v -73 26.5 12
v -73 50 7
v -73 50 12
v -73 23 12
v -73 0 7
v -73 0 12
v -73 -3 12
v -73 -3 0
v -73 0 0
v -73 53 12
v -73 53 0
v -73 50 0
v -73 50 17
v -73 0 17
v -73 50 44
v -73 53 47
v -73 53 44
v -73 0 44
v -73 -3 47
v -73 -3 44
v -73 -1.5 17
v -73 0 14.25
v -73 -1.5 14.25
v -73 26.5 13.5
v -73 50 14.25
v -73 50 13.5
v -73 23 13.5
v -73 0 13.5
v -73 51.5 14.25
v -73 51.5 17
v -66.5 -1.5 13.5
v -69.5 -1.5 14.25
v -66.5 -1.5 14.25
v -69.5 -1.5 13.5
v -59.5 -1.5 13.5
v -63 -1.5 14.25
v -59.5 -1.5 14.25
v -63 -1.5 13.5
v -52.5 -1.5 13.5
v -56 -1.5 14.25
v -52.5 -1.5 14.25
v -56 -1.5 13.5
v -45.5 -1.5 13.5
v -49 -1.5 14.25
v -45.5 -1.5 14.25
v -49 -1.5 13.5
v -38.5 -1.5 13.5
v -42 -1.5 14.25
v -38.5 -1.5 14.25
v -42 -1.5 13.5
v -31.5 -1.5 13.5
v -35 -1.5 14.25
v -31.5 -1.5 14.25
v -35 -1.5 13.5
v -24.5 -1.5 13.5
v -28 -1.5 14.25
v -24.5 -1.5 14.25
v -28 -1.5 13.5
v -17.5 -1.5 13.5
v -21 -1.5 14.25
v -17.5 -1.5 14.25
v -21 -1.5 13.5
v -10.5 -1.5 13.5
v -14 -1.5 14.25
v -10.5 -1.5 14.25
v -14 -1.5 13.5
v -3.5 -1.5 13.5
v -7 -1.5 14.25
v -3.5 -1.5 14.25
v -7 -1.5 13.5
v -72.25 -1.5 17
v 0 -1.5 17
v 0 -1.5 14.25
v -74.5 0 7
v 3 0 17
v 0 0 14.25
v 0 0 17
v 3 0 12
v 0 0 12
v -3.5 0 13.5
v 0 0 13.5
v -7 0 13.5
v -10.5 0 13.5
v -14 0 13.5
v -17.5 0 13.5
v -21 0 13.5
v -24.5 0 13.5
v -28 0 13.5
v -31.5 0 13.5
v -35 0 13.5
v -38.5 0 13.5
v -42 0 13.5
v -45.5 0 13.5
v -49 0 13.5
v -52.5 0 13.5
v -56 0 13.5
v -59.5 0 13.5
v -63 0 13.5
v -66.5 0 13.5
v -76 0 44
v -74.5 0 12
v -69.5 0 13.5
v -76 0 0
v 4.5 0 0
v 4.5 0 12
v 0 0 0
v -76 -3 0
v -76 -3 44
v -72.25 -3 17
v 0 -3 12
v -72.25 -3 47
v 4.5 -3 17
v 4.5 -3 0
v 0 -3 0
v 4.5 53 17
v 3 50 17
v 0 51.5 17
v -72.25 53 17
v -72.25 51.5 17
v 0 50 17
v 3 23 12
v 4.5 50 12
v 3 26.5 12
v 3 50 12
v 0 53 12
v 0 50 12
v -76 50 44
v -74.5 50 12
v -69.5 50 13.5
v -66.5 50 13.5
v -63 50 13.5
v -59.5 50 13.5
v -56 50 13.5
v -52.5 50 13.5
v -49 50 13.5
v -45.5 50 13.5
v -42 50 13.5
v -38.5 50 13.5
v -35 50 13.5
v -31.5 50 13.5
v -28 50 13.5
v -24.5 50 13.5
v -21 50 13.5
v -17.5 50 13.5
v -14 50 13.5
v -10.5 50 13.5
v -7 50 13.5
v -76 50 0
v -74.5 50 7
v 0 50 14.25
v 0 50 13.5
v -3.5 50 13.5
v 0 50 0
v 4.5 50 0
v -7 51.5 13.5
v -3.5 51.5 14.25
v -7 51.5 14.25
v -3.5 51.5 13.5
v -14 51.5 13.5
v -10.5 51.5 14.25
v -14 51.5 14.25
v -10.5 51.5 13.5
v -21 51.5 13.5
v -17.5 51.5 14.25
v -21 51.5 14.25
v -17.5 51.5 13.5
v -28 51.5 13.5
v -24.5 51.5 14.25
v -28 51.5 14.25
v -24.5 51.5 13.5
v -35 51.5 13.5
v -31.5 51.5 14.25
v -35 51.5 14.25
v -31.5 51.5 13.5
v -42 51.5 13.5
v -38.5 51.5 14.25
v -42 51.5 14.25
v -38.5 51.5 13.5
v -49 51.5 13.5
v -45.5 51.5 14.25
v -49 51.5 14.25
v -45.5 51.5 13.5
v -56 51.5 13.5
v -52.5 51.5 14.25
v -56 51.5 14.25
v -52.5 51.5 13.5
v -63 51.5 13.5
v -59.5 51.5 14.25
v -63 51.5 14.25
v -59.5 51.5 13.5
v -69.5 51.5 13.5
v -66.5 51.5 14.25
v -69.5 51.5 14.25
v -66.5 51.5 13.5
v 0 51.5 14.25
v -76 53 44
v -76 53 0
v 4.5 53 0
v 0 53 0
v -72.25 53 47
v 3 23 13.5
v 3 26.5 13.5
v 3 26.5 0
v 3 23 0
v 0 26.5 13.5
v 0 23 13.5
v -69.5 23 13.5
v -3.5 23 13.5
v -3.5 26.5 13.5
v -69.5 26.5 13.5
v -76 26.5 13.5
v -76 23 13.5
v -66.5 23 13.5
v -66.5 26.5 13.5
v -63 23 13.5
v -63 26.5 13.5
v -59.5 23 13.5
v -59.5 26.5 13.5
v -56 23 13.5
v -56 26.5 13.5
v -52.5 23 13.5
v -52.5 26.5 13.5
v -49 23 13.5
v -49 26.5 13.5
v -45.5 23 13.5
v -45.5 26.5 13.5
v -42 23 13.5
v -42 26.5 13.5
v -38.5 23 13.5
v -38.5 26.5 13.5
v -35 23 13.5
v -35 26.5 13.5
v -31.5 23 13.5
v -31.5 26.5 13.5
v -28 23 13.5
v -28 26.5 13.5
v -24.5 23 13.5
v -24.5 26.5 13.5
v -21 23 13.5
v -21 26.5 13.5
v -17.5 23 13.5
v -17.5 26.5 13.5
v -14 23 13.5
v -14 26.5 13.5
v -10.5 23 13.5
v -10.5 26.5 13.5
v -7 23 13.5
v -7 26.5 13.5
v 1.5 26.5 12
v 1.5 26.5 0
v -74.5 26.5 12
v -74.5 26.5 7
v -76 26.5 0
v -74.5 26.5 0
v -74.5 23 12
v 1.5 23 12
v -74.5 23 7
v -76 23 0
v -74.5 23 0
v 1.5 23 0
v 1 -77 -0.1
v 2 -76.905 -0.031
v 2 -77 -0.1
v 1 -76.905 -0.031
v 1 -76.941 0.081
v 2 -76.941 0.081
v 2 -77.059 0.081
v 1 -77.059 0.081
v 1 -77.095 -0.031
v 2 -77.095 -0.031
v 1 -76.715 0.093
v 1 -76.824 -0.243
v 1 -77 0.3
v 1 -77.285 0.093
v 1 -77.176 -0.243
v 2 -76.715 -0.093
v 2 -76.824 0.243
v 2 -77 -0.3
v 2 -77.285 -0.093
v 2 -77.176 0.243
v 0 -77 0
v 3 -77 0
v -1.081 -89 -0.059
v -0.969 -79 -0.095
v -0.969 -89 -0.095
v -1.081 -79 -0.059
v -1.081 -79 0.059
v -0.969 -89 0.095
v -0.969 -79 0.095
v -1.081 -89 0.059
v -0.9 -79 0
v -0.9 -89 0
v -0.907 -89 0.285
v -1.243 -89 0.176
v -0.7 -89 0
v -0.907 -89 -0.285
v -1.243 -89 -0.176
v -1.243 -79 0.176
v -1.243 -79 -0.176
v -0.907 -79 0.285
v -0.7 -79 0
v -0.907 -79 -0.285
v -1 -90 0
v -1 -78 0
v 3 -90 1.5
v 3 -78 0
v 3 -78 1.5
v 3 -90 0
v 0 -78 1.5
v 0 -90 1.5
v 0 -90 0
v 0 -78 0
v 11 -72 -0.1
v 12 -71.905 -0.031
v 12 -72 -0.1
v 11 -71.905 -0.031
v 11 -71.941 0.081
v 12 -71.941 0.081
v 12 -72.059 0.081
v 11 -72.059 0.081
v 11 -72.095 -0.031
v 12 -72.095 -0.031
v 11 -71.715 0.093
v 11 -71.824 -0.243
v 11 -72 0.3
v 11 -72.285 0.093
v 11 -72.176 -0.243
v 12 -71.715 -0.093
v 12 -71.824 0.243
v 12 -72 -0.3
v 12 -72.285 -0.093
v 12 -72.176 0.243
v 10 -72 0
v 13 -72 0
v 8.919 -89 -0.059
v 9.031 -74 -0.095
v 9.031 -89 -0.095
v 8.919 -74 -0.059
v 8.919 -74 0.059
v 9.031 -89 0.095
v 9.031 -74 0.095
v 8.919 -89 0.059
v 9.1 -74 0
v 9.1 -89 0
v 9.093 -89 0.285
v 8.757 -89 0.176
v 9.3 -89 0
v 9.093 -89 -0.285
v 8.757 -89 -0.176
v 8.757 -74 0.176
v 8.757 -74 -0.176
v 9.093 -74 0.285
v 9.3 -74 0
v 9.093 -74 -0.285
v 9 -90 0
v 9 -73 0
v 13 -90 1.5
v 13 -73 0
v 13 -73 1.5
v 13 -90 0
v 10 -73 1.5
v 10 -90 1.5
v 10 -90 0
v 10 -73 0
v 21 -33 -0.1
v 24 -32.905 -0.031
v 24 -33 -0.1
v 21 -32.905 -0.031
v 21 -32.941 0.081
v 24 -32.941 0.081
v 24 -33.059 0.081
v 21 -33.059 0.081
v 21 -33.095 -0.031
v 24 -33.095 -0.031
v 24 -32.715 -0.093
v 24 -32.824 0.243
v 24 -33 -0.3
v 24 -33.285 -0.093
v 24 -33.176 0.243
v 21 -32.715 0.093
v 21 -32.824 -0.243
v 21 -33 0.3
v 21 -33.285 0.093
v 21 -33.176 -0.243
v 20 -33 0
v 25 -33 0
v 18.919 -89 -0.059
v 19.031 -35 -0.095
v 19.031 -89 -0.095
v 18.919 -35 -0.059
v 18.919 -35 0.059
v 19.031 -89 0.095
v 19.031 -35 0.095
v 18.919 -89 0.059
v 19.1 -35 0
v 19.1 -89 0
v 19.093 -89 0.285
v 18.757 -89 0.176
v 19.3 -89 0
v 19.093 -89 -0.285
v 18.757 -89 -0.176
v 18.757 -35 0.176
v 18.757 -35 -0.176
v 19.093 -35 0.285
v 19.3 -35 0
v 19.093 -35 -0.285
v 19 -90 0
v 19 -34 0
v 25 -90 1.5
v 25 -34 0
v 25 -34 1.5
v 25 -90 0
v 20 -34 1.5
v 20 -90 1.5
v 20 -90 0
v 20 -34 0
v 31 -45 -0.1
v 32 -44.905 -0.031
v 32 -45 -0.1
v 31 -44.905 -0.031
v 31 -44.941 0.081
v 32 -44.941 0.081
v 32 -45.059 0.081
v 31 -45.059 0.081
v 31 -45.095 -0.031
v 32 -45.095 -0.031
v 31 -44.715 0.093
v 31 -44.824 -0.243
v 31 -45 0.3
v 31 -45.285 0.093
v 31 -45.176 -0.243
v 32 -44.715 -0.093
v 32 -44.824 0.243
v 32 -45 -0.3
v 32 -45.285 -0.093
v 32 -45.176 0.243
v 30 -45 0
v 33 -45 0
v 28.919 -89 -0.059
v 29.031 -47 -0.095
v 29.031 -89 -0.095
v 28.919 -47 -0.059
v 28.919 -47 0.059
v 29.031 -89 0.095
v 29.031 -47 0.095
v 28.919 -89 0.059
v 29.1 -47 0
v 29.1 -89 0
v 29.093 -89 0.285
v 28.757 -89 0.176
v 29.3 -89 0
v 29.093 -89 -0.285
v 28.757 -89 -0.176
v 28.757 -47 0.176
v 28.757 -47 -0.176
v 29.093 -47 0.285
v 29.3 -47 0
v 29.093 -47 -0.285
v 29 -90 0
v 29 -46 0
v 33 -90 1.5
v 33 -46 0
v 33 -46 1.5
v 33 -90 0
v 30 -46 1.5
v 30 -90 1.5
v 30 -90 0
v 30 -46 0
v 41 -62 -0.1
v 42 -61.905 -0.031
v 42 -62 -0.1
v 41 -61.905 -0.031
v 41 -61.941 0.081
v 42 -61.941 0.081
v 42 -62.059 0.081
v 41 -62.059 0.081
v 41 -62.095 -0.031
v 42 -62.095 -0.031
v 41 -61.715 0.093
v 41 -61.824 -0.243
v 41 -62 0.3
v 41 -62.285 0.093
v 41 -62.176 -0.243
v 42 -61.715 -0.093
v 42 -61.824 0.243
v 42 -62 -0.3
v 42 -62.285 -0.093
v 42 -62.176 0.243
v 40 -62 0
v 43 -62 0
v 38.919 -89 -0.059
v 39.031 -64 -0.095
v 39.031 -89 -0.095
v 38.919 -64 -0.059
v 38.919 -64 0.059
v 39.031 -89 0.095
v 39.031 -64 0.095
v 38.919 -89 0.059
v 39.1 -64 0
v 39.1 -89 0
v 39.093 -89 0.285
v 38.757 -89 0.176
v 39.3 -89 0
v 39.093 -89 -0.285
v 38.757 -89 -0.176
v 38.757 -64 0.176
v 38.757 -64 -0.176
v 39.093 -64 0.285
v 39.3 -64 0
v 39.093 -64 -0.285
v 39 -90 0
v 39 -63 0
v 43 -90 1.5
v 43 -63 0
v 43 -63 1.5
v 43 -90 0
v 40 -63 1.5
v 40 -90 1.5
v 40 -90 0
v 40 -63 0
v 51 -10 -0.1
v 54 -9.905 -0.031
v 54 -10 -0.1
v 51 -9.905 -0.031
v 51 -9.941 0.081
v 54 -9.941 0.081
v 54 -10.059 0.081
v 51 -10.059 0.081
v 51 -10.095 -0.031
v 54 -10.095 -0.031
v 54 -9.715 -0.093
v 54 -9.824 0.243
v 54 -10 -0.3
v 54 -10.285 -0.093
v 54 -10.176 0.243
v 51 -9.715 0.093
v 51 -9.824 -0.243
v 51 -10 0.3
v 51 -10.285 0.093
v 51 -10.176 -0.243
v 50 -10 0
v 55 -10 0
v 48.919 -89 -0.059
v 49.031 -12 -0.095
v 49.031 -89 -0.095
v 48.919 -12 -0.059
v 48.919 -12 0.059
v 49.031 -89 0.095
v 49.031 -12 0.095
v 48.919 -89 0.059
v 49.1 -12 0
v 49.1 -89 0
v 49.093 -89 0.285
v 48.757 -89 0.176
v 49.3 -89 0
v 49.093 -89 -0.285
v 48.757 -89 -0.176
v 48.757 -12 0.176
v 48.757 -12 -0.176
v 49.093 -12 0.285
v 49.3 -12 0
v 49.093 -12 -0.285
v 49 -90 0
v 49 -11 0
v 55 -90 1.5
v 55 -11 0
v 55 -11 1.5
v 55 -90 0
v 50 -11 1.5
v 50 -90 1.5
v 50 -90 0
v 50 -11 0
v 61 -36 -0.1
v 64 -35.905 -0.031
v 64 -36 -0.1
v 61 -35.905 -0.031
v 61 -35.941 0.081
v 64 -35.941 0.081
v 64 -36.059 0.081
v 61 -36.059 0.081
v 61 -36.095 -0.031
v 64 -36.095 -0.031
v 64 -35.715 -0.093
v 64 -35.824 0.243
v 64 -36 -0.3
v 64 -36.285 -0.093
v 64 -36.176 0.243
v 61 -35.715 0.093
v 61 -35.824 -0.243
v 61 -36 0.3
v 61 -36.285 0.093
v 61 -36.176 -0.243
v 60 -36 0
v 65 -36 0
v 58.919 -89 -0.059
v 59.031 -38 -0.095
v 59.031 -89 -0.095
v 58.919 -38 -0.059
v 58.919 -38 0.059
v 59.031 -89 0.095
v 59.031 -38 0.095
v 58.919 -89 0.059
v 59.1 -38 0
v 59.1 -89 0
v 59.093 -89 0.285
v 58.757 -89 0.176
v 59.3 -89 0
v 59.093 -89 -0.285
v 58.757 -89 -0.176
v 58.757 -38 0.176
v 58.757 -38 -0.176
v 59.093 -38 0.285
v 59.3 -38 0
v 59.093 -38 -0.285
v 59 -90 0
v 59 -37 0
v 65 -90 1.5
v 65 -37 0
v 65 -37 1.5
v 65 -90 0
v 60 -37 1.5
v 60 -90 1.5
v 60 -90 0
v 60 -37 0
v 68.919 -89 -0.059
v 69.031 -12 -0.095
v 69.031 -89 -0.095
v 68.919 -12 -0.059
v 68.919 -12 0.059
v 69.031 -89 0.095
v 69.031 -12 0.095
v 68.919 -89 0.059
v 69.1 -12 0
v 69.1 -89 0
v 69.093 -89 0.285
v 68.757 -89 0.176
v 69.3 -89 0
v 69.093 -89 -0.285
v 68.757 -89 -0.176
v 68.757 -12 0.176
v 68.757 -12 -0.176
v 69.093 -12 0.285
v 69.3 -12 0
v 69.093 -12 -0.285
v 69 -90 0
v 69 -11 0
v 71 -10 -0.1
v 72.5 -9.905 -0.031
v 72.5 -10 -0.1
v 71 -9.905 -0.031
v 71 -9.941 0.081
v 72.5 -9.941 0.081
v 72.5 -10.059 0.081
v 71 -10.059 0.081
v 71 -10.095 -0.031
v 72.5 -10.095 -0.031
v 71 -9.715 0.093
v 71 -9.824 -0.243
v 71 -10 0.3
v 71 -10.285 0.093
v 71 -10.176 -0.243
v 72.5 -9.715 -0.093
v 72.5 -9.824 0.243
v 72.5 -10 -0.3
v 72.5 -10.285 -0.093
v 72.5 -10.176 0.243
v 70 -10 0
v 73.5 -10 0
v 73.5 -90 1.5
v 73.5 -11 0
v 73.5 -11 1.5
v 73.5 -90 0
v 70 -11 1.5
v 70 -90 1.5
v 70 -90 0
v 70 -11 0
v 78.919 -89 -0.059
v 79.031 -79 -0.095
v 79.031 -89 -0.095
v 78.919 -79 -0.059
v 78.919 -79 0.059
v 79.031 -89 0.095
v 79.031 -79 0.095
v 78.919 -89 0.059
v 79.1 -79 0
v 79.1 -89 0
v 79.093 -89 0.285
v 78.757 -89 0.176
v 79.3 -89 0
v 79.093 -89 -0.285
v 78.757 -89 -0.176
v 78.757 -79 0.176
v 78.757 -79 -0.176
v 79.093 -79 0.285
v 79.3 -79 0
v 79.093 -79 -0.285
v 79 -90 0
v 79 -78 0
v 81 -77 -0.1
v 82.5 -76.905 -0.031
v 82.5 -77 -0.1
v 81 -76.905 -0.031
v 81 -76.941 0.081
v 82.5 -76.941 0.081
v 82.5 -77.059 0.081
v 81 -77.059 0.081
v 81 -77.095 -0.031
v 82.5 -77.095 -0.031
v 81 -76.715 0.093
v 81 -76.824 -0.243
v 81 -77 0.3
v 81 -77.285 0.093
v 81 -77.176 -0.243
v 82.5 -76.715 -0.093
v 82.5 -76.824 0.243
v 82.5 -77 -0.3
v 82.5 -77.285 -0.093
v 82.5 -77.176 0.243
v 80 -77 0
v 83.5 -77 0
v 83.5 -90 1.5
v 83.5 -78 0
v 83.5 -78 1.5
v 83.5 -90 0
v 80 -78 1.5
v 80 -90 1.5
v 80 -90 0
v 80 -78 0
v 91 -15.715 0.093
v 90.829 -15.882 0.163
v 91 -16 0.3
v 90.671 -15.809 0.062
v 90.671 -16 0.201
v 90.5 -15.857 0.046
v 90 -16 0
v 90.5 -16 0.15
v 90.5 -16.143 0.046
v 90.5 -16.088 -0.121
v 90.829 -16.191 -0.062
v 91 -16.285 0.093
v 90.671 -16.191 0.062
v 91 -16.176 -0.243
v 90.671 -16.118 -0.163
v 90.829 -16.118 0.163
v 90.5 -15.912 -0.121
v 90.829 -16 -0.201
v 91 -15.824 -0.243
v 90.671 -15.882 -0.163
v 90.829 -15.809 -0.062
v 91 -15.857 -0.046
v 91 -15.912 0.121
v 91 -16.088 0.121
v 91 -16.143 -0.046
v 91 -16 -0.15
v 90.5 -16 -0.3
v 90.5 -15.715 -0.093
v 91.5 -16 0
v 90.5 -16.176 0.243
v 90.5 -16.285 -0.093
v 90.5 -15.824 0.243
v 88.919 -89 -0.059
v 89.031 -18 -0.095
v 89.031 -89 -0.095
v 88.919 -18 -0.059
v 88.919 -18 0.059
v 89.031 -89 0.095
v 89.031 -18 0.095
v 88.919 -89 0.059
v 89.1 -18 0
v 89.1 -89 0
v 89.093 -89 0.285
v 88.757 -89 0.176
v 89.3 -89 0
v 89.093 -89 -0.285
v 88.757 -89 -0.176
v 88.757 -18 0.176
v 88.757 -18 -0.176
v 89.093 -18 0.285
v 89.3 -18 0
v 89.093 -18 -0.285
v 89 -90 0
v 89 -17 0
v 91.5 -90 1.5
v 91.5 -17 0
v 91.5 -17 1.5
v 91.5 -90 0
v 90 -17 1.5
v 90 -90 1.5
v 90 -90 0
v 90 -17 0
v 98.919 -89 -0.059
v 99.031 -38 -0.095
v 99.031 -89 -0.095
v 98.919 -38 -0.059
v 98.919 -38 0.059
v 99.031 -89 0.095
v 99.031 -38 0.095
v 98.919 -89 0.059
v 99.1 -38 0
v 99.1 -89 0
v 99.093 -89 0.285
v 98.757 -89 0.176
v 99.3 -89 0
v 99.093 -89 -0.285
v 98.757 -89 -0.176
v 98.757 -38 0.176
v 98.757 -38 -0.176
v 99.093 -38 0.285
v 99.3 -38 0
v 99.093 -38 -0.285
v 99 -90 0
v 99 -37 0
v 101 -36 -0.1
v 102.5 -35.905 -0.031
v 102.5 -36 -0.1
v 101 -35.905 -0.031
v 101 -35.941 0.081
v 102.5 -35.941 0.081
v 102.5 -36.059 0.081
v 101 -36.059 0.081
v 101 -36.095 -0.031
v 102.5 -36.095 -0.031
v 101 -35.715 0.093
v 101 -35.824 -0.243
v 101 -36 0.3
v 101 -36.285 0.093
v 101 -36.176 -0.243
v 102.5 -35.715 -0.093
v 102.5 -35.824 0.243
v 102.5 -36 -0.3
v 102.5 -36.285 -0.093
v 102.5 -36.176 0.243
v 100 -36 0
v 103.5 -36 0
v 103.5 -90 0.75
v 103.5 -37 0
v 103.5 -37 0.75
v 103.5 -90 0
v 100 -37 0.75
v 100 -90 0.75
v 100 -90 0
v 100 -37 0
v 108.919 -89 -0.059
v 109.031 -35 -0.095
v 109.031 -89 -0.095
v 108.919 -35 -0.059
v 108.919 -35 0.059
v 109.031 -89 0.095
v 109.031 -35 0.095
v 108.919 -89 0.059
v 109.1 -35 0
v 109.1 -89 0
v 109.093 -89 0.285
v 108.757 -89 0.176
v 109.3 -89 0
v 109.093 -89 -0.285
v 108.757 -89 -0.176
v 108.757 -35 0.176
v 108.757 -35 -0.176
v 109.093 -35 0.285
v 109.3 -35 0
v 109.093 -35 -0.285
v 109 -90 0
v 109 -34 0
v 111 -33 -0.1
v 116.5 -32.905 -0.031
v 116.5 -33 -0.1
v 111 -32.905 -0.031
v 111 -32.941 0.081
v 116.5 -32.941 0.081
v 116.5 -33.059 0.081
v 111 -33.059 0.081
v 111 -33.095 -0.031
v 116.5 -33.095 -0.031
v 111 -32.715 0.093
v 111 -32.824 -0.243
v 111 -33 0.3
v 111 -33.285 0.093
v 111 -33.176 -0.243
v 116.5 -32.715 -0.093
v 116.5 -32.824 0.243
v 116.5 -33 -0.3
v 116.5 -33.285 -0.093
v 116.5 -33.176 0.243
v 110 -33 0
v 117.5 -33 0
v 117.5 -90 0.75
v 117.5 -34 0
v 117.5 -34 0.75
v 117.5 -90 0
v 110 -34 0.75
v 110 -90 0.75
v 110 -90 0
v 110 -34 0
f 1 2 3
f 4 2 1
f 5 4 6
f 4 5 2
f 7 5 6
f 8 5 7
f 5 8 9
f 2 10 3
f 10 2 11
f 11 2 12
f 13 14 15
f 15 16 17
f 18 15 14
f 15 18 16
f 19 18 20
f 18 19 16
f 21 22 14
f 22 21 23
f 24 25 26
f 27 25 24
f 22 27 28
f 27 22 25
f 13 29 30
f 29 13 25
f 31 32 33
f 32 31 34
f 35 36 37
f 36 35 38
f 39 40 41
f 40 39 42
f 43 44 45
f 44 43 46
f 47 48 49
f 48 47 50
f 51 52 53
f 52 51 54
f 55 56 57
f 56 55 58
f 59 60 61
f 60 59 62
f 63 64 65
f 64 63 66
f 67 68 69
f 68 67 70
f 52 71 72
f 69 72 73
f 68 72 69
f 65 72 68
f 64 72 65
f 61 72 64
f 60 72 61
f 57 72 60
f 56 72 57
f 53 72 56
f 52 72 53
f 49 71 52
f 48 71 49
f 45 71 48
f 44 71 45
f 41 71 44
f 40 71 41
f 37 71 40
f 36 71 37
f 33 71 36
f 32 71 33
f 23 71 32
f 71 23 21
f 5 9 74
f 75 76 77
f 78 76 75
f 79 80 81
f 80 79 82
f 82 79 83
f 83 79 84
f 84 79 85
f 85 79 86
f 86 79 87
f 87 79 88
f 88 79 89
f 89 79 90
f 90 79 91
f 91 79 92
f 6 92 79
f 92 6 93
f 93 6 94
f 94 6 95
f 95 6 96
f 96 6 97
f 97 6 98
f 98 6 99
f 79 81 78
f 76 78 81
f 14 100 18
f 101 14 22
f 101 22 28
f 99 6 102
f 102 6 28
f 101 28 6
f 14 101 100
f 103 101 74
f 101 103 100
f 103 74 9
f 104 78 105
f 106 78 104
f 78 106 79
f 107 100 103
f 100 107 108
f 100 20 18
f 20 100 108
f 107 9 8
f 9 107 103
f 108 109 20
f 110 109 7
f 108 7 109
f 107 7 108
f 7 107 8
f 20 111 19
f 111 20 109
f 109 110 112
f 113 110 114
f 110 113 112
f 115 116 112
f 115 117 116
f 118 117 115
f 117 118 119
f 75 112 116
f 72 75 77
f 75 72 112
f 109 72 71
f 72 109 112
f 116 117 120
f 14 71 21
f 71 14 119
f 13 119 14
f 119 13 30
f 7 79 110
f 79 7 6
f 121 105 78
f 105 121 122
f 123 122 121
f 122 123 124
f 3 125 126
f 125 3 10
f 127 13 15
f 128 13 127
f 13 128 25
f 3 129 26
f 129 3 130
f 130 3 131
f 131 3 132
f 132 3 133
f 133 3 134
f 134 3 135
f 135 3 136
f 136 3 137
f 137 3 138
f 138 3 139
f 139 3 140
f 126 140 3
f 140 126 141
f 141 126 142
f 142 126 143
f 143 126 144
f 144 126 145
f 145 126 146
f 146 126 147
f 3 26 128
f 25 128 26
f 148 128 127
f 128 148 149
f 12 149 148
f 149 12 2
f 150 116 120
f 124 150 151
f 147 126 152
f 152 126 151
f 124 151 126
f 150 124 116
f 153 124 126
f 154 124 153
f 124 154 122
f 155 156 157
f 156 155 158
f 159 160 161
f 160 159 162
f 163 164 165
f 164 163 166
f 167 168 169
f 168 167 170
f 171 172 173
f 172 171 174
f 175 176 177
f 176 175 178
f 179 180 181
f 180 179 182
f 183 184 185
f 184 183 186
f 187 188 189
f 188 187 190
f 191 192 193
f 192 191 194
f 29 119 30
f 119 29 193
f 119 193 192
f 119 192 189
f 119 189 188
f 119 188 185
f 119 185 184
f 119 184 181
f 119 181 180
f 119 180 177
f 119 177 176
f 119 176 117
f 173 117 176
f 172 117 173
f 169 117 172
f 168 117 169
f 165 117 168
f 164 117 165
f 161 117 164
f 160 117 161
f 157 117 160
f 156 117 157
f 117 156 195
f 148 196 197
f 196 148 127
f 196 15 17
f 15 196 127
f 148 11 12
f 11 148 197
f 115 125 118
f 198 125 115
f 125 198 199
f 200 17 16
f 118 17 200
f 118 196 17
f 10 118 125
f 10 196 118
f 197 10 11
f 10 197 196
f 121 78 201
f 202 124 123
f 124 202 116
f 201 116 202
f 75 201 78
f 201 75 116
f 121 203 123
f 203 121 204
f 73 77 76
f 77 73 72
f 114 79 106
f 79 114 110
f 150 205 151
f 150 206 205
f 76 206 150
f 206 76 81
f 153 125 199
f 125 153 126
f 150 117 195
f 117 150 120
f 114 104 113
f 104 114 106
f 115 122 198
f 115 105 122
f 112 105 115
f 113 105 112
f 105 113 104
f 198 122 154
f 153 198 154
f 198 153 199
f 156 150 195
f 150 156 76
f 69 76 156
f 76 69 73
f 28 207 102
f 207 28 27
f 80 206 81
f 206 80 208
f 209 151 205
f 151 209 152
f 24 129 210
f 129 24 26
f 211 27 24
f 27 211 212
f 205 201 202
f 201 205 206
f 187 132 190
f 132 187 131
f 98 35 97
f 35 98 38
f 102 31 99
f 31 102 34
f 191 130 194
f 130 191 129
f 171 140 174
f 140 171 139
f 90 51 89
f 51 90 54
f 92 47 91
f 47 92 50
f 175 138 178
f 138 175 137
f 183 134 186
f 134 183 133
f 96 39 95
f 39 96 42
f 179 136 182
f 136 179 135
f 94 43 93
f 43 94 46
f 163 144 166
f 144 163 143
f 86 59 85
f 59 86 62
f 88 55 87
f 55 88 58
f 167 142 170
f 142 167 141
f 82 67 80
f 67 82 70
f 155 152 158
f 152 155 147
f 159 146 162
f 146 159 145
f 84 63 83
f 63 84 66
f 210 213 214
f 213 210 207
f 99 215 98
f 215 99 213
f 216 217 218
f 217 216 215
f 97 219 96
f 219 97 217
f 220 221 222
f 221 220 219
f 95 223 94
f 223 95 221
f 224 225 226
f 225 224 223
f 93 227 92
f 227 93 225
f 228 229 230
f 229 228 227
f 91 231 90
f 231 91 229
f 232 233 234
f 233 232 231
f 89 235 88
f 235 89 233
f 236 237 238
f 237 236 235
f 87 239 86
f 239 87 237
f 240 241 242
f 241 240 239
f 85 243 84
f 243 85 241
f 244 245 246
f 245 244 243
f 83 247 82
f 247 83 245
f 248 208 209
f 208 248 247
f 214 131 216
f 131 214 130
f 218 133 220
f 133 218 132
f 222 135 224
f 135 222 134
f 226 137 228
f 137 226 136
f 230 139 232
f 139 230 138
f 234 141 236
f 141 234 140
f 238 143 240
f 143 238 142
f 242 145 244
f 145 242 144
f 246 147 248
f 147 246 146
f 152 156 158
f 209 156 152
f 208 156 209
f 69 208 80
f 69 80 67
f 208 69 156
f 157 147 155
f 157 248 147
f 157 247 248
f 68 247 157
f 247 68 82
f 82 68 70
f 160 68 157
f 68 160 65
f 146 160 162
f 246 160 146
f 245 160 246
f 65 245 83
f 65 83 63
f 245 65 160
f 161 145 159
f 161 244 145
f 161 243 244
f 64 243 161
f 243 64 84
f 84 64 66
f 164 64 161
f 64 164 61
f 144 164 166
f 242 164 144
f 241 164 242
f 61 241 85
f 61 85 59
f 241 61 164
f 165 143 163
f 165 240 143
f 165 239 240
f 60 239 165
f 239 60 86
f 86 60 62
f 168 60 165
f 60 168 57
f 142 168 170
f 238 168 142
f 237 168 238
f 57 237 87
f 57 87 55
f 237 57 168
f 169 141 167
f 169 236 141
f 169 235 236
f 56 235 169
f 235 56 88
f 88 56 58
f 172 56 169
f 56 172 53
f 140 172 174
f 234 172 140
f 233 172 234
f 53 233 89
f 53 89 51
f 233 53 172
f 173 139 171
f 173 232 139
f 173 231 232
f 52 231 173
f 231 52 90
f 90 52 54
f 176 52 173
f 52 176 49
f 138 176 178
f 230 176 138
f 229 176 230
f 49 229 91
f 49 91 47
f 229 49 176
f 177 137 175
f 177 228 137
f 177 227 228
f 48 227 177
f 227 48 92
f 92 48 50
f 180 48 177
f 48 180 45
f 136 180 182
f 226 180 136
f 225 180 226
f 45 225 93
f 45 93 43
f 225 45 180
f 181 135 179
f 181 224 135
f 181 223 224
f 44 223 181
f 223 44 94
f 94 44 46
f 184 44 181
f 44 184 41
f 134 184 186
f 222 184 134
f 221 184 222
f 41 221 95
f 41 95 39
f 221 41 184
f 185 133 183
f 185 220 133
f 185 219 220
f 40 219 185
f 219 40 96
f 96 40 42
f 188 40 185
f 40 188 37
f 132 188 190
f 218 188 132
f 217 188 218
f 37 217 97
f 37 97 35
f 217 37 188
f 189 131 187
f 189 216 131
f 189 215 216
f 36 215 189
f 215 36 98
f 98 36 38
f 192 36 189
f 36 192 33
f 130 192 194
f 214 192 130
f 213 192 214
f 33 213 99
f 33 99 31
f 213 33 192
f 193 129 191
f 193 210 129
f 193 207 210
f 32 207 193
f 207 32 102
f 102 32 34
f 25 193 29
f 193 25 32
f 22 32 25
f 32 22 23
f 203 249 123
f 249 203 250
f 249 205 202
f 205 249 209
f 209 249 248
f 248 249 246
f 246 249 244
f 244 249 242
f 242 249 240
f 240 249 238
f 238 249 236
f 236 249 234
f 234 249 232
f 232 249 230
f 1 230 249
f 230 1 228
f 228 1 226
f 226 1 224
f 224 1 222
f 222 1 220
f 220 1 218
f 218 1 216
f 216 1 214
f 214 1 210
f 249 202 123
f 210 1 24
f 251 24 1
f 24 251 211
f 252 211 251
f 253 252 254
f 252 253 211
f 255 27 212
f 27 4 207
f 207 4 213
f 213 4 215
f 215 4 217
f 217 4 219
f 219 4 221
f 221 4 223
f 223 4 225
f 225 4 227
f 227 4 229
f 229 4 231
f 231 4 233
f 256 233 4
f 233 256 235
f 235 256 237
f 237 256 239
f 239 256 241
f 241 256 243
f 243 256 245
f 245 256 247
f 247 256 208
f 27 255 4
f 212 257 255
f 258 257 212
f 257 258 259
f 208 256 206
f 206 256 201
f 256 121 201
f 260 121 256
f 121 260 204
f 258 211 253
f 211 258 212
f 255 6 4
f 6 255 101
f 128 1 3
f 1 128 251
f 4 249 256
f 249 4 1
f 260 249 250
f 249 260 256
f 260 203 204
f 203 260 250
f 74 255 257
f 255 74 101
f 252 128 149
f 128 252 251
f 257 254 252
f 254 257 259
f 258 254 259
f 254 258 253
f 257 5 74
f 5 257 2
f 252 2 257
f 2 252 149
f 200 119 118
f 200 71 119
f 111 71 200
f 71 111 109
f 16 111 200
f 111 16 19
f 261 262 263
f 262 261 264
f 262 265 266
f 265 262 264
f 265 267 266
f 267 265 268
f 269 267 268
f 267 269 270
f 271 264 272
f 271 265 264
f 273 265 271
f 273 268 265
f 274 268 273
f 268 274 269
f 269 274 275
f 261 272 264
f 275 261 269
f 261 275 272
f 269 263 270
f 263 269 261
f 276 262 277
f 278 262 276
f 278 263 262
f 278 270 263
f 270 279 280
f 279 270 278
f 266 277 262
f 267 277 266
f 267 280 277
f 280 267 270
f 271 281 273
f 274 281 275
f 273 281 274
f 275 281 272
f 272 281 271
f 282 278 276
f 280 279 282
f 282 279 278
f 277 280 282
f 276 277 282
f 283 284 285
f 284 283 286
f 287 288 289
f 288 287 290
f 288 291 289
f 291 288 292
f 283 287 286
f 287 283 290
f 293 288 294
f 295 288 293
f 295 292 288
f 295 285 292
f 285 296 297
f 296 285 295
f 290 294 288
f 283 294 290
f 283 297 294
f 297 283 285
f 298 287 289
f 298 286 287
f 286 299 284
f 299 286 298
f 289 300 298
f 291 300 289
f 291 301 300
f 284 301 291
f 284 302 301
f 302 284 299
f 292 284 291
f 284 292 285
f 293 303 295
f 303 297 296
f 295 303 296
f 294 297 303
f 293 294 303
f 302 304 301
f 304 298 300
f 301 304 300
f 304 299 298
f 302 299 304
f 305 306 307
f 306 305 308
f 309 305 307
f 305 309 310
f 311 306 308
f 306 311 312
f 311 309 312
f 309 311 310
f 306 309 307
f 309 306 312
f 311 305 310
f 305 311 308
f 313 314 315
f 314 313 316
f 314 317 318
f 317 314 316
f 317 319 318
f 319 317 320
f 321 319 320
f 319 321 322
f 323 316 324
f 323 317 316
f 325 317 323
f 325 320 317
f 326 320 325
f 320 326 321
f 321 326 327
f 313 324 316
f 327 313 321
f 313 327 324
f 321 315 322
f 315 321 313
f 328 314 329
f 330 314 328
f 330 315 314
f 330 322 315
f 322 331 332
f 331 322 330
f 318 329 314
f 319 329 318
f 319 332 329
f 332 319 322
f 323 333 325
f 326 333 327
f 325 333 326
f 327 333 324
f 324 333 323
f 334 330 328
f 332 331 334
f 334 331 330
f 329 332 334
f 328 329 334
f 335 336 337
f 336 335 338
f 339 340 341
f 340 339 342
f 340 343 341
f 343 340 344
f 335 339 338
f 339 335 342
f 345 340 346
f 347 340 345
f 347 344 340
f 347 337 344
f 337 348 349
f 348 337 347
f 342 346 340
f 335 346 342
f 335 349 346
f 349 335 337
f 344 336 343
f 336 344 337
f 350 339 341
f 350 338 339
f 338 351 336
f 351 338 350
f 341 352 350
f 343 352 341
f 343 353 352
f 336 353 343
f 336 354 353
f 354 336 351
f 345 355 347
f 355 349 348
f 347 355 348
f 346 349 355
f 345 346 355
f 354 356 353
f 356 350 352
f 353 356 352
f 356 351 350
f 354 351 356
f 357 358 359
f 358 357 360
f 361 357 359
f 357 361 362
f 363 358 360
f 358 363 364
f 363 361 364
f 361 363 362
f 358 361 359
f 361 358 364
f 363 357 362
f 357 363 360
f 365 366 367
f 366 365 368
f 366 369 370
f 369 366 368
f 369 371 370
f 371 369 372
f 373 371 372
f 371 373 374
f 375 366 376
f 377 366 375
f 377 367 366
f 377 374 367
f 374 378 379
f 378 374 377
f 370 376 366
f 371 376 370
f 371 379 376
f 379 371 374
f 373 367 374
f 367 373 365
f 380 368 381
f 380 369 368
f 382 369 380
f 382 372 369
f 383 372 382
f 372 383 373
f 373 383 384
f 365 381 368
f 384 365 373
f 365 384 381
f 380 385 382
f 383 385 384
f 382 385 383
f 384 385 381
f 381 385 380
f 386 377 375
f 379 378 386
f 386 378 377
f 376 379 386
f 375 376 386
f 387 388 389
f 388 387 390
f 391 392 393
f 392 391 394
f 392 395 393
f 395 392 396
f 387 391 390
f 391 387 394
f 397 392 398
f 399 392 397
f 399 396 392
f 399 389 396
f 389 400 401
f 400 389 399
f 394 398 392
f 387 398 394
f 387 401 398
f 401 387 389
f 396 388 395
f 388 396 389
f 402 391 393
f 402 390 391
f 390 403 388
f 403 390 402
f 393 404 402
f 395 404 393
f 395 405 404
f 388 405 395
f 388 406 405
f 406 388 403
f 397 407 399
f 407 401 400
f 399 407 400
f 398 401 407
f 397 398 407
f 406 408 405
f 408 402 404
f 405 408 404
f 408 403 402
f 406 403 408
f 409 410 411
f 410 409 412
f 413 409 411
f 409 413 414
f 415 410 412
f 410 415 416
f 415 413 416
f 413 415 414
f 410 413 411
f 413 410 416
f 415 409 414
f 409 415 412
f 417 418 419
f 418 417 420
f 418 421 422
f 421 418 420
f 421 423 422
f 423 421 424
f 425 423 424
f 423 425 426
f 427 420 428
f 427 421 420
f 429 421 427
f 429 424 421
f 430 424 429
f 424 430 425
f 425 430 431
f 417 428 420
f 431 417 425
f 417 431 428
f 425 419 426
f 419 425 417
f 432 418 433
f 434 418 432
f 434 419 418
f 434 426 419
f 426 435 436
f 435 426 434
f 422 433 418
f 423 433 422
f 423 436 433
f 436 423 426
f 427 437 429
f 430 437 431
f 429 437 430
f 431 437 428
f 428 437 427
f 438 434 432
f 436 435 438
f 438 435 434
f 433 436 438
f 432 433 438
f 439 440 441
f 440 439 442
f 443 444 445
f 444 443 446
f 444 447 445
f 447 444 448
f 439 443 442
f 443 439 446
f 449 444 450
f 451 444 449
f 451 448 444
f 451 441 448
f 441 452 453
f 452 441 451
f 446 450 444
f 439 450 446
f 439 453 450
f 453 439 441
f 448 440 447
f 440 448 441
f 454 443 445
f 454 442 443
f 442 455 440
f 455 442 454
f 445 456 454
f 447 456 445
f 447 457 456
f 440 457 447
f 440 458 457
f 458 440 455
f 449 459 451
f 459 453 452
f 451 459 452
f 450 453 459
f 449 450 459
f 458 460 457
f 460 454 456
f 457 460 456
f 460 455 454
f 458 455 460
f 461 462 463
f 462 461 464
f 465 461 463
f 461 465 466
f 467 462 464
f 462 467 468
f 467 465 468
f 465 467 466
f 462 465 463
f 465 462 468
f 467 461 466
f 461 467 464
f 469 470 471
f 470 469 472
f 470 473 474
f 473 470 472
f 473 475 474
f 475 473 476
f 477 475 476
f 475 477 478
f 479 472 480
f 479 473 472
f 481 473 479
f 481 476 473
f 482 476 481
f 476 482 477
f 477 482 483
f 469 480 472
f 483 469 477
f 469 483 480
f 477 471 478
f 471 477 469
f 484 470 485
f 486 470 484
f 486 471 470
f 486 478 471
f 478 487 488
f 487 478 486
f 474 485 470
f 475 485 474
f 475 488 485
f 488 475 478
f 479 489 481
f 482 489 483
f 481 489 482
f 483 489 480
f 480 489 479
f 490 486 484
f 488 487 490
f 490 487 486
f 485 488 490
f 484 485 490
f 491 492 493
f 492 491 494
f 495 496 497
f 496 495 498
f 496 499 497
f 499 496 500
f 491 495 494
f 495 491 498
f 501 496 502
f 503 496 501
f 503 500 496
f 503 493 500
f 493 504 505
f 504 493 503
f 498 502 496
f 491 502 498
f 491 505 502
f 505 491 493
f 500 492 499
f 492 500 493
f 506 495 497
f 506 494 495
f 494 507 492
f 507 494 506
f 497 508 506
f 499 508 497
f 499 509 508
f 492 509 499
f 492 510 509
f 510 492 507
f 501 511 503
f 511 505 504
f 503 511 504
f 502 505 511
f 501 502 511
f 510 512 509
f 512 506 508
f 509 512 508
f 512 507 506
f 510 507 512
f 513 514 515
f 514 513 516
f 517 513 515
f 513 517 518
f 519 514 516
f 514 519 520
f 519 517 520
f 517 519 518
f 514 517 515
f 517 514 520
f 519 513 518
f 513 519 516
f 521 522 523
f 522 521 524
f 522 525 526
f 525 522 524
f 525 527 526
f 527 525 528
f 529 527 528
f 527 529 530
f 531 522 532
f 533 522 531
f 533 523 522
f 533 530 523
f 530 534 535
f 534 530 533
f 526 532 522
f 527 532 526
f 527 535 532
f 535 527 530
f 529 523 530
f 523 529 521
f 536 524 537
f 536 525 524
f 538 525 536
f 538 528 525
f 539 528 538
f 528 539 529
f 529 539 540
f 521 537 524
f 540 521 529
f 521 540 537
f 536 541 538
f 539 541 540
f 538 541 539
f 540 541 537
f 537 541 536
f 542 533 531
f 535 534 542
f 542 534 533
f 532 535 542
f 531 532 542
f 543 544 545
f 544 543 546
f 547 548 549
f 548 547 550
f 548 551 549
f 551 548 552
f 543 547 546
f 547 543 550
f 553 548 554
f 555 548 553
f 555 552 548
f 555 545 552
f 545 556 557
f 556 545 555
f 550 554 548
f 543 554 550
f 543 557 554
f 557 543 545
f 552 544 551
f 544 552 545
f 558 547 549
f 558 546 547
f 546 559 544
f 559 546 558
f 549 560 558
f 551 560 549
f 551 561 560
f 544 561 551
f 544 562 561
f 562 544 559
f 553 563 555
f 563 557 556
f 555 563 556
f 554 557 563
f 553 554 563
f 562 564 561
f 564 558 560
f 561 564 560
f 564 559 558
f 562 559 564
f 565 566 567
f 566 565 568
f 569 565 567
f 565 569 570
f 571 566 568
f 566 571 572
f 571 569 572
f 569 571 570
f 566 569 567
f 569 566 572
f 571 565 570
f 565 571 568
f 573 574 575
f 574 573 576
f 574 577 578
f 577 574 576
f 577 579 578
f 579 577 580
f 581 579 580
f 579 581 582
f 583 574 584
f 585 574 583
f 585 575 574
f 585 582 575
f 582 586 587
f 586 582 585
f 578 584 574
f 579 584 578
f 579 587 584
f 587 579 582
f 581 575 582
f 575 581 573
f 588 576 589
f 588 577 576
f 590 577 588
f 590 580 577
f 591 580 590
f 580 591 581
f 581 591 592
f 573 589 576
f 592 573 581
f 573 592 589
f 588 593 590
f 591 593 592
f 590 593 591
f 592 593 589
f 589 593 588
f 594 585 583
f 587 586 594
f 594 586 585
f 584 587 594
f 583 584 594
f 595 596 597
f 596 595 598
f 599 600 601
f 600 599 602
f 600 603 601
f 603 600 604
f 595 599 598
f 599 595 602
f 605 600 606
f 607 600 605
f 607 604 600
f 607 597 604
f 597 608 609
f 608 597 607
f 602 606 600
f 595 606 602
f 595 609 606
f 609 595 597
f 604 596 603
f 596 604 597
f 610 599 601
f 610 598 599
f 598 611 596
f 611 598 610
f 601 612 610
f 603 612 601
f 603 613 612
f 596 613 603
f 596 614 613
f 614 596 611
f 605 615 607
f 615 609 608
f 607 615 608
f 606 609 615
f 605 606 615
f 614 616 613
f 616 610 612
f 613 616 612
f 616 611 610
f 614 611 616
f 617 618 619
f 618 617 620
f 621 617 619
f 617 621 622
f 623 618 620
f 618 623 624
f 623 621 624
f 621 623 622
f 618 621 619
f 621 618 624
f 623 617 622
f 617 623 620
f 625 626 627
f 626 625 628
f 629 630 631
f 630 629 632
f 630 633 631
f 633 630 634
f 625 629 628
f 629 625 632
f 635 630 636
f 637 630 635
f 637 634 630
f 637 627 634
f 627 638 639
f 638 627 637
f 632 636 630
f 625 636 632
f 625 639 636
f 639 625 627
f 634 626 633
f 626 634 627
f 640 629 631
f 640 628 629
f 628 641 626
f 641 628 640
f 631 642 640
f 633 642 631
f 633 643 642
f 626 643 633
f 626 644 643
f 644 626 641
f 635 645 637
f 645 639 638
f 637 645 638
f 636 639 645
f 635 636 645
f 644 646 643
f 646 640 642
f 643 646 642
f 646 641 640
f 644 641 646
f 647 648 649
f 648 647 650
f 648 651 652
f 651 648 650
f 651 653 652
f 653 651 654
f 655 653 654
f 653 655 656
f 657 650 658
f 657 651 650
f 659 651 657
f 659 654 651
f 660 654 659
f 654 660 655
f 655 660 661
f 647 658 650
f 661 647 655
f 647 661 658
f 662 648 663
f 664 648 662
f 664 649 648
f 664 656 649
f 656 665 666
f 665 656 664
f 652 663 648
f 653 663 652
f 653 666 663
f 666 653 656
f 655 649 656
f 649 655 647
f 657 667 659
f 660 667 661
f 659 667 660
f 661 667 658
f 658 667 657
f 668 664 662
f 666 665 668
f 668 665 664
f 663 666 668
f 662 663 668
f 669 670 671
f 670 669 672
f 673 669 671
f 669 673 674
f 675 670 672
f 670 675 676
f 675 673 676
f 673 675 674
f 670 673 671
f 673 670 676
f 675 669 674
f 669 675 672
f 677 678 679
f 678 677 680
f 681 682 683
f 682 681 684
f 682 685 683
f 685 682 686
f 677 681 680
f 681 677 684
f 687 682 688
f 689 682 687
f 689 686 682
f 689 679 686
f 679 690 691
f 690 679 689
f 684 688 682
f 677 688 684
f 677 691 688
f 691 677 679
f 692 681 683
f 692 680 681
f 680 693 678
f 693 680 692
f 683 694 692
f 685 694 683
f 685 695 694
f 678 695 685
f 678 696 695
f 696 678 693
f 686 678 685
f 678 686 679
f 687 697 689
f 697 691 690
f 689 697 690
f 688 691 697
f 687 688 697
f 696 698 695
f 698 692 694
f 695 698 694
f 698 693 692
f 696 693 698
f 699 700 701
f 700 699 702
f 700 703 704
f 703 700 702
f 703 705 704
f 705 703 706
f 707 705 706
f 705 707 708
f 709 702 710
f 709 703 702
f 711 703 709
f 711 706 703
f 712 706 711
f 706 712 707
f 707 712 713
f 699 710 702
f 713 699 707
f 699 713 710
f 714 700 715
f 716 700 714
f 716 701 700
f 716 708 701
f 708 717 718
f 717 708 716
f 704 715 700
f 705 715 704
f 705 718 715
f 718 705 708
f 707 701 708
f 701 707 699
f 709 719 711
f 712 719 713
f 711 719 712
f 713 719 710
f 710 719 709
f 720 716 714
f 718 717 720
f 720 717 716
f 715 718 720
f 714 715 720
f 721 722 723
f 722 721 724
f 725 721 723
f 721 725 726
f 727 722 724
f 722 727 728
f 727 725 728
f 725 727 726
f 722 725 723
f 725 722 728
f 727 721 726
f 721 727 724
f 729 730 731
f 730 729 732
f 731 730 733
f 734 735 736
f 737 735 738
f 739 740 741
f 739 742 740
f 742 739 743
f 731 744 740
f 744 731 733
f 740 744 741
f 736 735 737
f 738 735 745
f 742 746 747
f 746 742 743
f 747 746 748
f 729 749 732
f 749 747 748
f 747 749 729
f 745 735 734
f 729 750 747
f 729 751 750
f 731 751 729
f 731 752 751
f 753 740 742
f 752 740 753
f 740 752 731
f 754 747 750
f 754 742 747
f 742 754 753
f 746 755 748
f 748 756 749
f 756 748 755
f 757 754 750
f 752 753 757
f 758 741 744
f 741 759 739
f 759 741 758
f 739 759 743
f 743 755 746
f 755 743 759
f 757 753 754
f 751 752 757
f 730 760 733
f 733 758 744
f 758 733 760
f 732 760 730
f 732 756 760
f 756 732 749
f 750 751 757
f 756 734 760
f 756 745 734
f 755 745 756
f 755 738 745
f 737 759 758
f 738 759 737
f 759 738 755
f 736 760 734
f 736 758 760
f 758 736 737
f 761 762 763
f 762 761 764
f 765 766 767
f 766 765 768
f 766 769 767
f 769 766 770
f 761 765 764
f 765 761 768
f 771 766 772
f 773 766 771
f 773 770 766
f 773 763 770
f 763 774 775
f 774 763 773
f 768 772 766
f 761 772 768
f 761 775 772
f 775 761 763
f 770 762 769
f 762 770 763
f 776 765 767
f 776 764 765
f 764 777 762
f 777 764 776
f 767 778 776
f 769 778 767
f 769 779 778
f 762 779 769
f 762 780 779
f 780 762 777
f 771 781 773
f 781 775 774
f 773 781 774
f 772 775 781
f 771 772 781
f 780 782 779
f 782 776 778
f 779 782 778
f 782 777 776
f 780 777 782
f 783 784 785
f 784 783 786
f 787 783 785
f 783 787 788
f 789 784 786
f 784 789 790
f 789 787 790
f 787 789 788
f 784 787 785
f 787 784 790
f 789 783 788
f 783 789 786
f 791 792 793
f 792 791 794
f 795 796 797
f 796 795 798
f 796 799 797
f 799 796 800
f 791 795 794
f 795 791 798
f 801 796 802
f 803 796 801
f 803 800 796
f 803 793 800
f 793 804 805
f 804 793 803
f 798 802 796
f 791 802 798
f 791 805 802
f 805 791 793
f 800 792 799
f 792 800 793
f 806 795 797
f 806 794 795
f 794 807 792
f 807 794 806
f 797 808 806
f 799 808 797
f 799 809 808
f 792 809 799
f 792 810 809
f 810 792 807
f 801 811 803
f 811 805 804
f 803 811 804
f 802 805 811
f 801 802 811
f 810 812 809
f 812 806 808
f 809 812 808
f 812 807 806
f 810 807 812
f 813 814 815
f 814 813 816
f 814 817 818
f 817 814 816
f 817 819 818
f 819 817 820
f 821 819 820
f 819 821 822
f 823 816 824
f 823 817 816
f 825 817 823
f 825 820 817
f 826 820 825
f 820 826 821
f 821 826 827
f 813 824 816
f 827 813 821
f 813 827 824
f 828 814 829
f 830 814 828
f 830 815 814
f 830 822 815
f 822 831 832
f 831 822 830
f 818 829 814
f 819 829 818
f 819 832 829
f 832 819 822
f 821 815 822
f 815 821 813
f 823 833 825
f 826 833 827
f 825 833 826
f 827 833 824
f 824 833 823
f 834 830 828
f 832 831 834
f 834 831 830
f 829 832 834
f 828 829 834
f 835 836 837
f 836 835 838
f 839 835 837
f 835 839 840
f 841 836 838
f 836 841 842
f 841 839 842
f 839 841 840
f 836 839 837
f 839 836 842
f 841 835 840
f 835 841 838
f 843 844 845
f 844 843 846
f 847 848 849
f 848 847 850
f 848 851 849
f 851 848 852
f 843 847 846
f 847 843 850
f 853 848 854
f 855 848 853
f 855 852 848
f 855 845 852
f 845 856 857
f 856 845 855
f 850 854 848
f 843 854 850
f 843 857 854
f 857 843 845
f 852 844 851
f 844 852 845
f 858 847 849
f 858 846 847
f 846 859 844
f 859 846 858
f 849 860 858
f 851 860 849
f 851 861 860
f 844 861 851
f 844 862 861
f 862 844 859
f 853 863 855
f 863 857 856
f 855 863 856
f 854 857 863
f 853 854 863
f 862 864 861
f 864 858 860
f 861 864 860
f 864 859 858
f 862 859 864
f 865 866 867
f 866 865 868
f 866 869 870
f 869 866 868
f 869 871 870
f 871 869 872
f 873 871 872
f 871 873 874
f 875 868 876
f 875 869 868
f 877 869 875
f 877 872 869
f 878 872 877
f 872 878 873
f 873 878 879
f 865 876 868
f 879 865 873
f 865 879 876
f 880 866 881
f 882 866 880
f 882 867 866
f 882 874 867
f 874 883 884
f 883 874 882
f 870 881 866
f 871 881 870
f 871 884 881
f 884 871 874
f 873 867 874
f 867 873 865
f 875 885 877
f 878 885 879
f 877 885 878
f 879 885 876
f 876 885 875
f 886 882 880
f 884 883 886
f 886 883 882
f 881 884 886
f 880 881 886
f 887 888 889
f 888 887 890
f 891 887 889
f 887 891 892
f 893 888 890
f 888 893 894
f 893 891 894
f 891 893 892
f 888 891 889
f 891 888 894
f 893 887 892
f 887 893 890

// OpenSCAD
// file: ../lib/common.scad
//--------------------------------------------------------------------------------------------------
// Module Prism
//--------------------------------------------------------------------------------------------------
module prism(z, y, x)
{
    rotate([0, 90, 0])
    {
        polyhedron(
                points=[[0,0,0], [x,0,0], [x,y,0], [0,y,0], [0,y,z], [x,y,z]],
                faces=[[0,1,2,3],[5,4,3,2],[0,4,5,1],[0,3,4],[5,2,1]]);
    }
    
}

//--------------------------------------------------------------------------------------------------
// Module Side panel
//--------------------------------------------------------------------------------------------------
module rect_cut(x, y, z, dx, dy)
{
    // Top panel
    translate([0, dy, 0])
    {
        cube([x, y - dy, z]);
    };

    // Left bottom panel
    translate([0, 0, 0])
    {
        cube([dx, dy, z]);
    };

    // Triangle
    translate([dx, 0, 0])
    {
        rotate([0, 0, 0])
        {
            prism(x - dx, dy, -z);
        }
    };
}

//--------------------------------------------------------------------------------------------------
// X dimensional arrow
//--------------------------------------------------------------------------------------------------
module arrow_x(l)
{
    line_w = 0.1;
    arrow_w = 1;
    arrow_h = 0.3;

    // Line
    translate([l / 2, 0, 0])
    {
        rotate([0, 90, 0])
        {
            color([0.4, 0.4, 0.4])
            cylinder(l - arrow_w * 2, line_w, line_w, true);
        }
    }

    // Left arrow
    translate([arrow_w, 0, 0])
    {
        rotate([0, 270, 0])
        {
            color([0.4, 0.4, 0.4])
            cylinder(arrow_w, arrow_h, 0, false);
        }
    }

    // Right arrow
    translate([l - arrow_w, 0, 0])
    {
        rotate([0, 90, 0])
        {
            color([0.4, 0.4, 0.4])
            cylinder(arrow_w, arrow_h, 0, false);
        }
    }

    // Text
    translate([l/3, 0.5, 0])
    {
        color([0.4, 0.4, 0.4])
        text(str(l), size=1);
    }
}

//--------------------------------------------------------------------------------------------------
// Y dimensional arrow
//--------------------------------------------------------------------------------------------------
module arrow_y(l)
{
    line_w = 0.1;
    arrow_w = 1;
    arrow_h = 0.3;

    // Line
    translate([0, l / 2, 0])
    {
        rotate([90, 0, 00])
        {
            color([0.4, 0.4, 0.4])
            cylinder(l - arrow_w * 2, line_w, line_w, true);
        }
    }

    // Left arrow
    translate([0 ,arrow_w, 0])
    {
        rotate([90, 0, 0])
        {
            color([0.4, 0.4, 0.4])
            cylinder(arrow_w, arrow_h, 0, false);
        }
    }

    // Right arrow
    translate([0, l - arrow_w, 0])
    {
        rotate([270, 0, 0])
        {
            color([0.4, 0.4, 0.4])
            cylinder(arrow_w, arrow_h, 0, false);
        }
    }

    // Text
    translate([-0.5, l/3, 0])
    {
        rotate([0 ,0, 90])
        {
            color([0.4, 0.4, 0.4])
            text(str(l), size=1);
        }
    }
}

//--------------------------------------------------------------------------------------------------
// Z dimensional arrow
//--------------------------------------------------------------------------------------------------
module arrow_z(l)
{
    line_w = 0.1;
    arrow_w = 1;
    arrow_h = 0.3;

    // Line
    translate([0, 0, l / 2])
    {
        rotate([0, 0, 0])
        {
            color([0.4, 0.4, 0.4])
            cylinder(l - arrow_w * 2, line_w, line_w, true);
        }
    }

    // Left arrow
    translate([0, 0, arrow_w])
    {
        rotate([0, 180, 0])
        {
            color([0.4, 0.4, 0.4])
            cylinder(arrow_w, arrow_h, 0, false);
        }
    }

    // Right arrow
    translate([0, 0, l - arrow_w])
    {
        rotate([0, 0, 0])
        {
            color([0.4, 0.4, 0.4])
            cylinder(arrow_w, arrow_h, 0, false);
        }
    }

    // Text
    translate([0.5, 0, l/3])
    {
        rotate([90 ,0, 90])
        {
            color([0.4, 0.4, 0.4])
            text(str(l), size=1);
        }
    }
}

//--------------------------------------------------------------------------------------------------
// parallelogram
//--------------------------------------------------------------------------------------------------
module parallelogram(x = 12, y = 12, z = 1, xd = 0)
{
    points = [
        [0, 0, 0 ],        //0
        [x, 0, 0 ],        //1
        [x + xd, y, 0],    //2
        [xd, y, 0 ],       //3
        [0, 0, z ],        //4
        [x, 0, z ],        //5
        [x + xd, y, z ],   //6
        [xd, y, z ]];      //7

    faces = [
        [0,1,2,3],         // bottom
        [4,5,1,0],         // front
        [7,6,5,4],         // top
        [5,6,2,1],         // right
        [6,7,3,2],         // back
        [7,4,0,3]];        // left

    polyhedron(points, faces);
}
// main file
include <../lib/common.scad>

//--------------------------------------------------------------------------------------------------
// Parts
//--------------------------------------------------------------------------------------------------
module front_leg_1()
{
    color([1, 0, 0])
    cube([3, 12, 1.5]);
}

module front_leg_2()
{
    color([0, 0, 1])
    cube([3, 17, 1.5]);
}

module front_panel()
{
    color([1, 1, 0])
    cube([5, 56, 1.5]);
}

module back_leg_1()
{
    color([1, 0, 1])
    cube([3, 44, 1.5]);
}

module back_leg_2()
{
    color([1, 0.7, 0.7])
    cube([3, 27, 1.5]);
}

module back_panel_1()
{
    color([0.7, 0.7, 1])
    cube([5, 53, 1.5]);
}

module back_panel_2()
{
    color([0.7, 0.2, 1])
    cube([7.5, 56, 0.75]);
}

module side_panel()
{
    color([0.6, 1, 0.6])
    cube([5, 79, 1.5]);
}

module side_bar()
{
    color([1, 0.5, 0.5])
    cube([1.5, 73, 1.5]);
}

module center_bar()
{
    color([0.9, 0.7, 0.6])
    cube([3.5, 79, 1.5]);
}

module center_bar_leg()
{
    color([0.3, 0.8, 0.9])
    cube([3.5, 12, 1.5]);
}

module board()
{
    color([0.8, 0.2, 0.3])
    cube([3.5, 53, 0.75]);
}

module mattress()
{
    color([0.8, 0.9, 0.9])
    cube([53, 75, 10]);
}

//--------------------------------------------------------------------------------------------------
module back_leg_l()
{
    translate([0, 0, 0])
    {
        back_leg_1();
    }

    translate([0, 17, 1.5])
    {
        back_leg_2();
    }

    translate([0, 0, 1.5])
    {
        front_leg_1();
    }
}

//--------------------------------------------------------------------------------------------------
module back_leg_r()
{
    translate([0, 0, 1.5])
    {
        back_leg_1();
    }

    translate([0, 17, 0])
    {
        back_leg_2();
    }

    translate([0, 0, 0])
    {
        front_leg_1();
    }
}

//--------------------------------------------------------------------------------------------------
module front_leg_l()
{
    translate([0, 0, 1.5])
    {
        front_leg_1();
    }

    translate([4.5, 0, 0])
    {
        rotate([0, -90, 0])
        {
            front_leg_1();
        }
    }

    translate([0, 0, 0])
    {
        front_leg_2();
    }
}

//--------------------------------------------------------------------------------------------------
module front_leg_r()
{
    translate([0, 0, 0])
    {
        front_leg_1();
    }

    translate([4.5, 0, 0])
    {
        rotate([0, -90, 0])
        {
            front_leg_1();
        }
    }

    translate([0, 0, 1.5])
    {
        front_leg_2();
    }
}

//--------------------------------------------------------------------------------------------------
// Render
//--------------------------------------------------------------------------------------------------
translate([0, 0, 0])
{
    //----------------------------------------------------------------------------------------------
    // mattress
    //----------------------------------------------------------------------------------------------
    *translate([3, -1.5, 14.25])
    {
        rotate([0, 0, 90])
        {
            mattress();
        }
    };

    //----------------------------------------------------------------------------------------------
    // center bar
    //----------------------------------------------------------------------------------------------
    translate([3, 23, 12])
    {
        rotate([0, 0, 90])
        {
            center_bar();
        }
    };

    //----------------------------------------------------------------------------------------------
    // center bar leg 1
    //----------------------------------------------------------------------------------------------
    translate([1.5, 23, 0])
    {
        rotate([90, 0, 90])
        {
            center_bar_leg();
        }
    };

    //----------------------------------------------------------------------------------------------
    // center bar leg 2
    //----------------------------------------------------------------------------------------------
    translate([-76, 23, 0])
    {
        rotate([90, 0, 90])
        {
            center_bar_leg();
        }
    };

    //----------------------------------------------------------------------------------------------
    // back leg L
    //----------------------------------------------------------------------------------------------
    translate([-76, 0, 0])
    {
        rotate([90, 0, 0])
        {
            back_leg_l();
        }
    };

    //----------------------------------------------------------------------------------------------
    // back leg R
    //----------------------------------------------------------------------------------------------
    translate([-76, 53, 0])
    {
        rotate([90, 0, 0])
        {
            back_leg_r();
        }
    };

    //----------------------------------------------------------------------------------------------
    // back panel
    //----------------------------------------------------------------------------------------------
    translate([-73, -1.5, 7])
    {
        rotate([0, -90, 0])
        {
            back_panel_1();
        }
    };

    translate([-72.25, -3, 17])
    {
        rotate([0, -90, 0])
        {
            back_panel_2();
        }
    };

    translate([-72.25, -3, 24.5])
    {
        rotate([0, -90, 0])
        {
            back_panel_2();
        }
    };

    translate([-72.25, -3, 32])
    {
        rotate([0, -90, 0])
        {
            back_panel_2();
        }
    };

    translate([-72.25, -3, 39.5])
    {
        rotate([0, -90, 0])
        {
            back_panel_2();
        }
    };


    //----------------------------------------------------------------------------------------------
    // front leg L
    //----------------------------------------------------------------------------------------------
    translate([0, 0, 0])
    {
        rotate([90, 0, 0])
        {
            front_leg_l();
        }
    };

    //----------------------------------------------------------------------------------------------
    // front leg R
    //----------------------------------------------------------------------------------------------
    translate([0, 53, 0])
    {
        rotate([90, 0, 0])
        {
            front_leg_r();
        }
    };

    //----------------------------------------------------------------------------------------------
    // front panel
    //----------------------------------------------------------------------------------------------
    translate([3, -3, 17])
    {
        rotate([0, 90, 0])
        {
            front_panel();
        }
    }

    //----------------------------------------------------------------------------------------------
    // side panel L
    //----------------------------------------------------------------------------------------------
    translate([3, -3, 17])
    {
        rotate([0, 90, 90])
        {
            side_panel();
        }
    }

    //----------------------------------------------------------------------------------------------
    // side bar L
    //----------------------------------------------------------------------------------------------
    translate([0, -1.5, 13.5])
    {
        rotate([0, 90, 90])
        {
            side_bar();
        }
    }

    //----------------------------------------------------------------------------------------------
    // side panel R
    //----------------------------------------------------------------------------------------------
    translate([3, 51.5, 17])
    {
        rotate([0, 90, 90])
        {
            side_panel();
        }
    }

    //----------------------------------------------------------------------------------------------
    // side bar R
    //----------------------------------------------------------------------------------------------
    translate([0, 50, 13.5])
    {
        rotate([0, 90, 90])
        {
            side_bar();
        }
    }

    //----------------------------------------------------------------------------------------------
    // boards
    //----------------------------------------------------------------------------------------------
    translate([-3.5, -1.5, 13.5])
    {
        translate([0, 0, 0])
        {
            rotate([0, 0, 0])
            {
                board();
            }
        }

        translate([-7, 0, 0])
        {
            rotate([0, 0, 0])
            {
                board();
            }
        }

        translate([-14, 0, 0])
        {
            rotate([0, 0, 0])
            {
                board();
            }
        }

        translate([-21, 0, 0])
        {
            rotate([0, 0, 0])
            {
                board();
            }
        }

        translate([-28, 0, 0])
        {
            rotate([0, 0, 0])
            {
                board();
            }
        }

        translate([-35, 0, 0])
        {
            rotate([0, 0, 0])
            {
                board();
            }
        }

        translate([-42, 0, 0])
        {
            rotate([0, 0, 0])
            {
                board();
            }
        }

        translate([-49, 0, 0])
        {
            rotate([0, 0, 0])
            {
                board();
            }
        }

        translate([-56, 0, 0])
        {
            rotate([0, 0, 0])
            {
                board();
            }
        }

        translate([-63, 0, 0])
        {
            rotate([0, 0, 0])
            {
                board();
            }
        }

        translate([-69.5, 0, 0])
        {
            rotate([0, 0, 0])
            {
                board();
            }
        }
    }
}


//--------------------------------------------------------------------------------------------------
// Draw Parts
//--------------------------------------------------------------------------------------------------
translate([0, -90, 0])
{
    //----------------------------------------------------------------------------------------------
    translate([0, 0, 0])
    {
        front_leg_1();
        translate([0, 13, 0])
        {
            arrow_x(3);
        };
        translate([-1, 0, 0])
        {
            arrow_y(12);
        };
    };

    //----------------------------------------------------------------------------------------------
    translate([10, 0, 0])
    {
        front_leg_2();
        translate([0, 18, 0])
        {
            arrow_x(3);
        };
        translate([-1, 0, 0])
        {
            arrow_y(17);
        };
    };

    //----------------------------------------------------------------------------------------------
    translate([20, 0, 0])
    {
        front_panel();
        translate([0, 57, 0])
        {
            arrow_x(5);
        };
        translate([-1, 0, 0])
        {
            arrow_y(56);
        };
    };

    //----------------------------------------------------------------------------------------------
    translate([30, 0, 0])
    {
        back_leg_1();
        translate([0, 45, 0])
        {
            arrow_x(3);
        };
        translate([-1, 0, 0])
        {
            arrow_y(44);
        };
    };

    //----------------------------------------------------------------------------------------------
    translate([40, 0, 0])
    {
        back_leg_2();
        translate([0, 28, 0])
        {
            arrow_x(3);
        };
        translate([-1, 0, 0])
        {
            arrow_y(27);
        };
    };

    //----------------------------------------------------------------------------------------------
    translate([50, 0, 0])
    {
        side_panel();
        translate([0, 80, 0])
        {
            arrow_x(5);
        };
        translate([-1, 0, 0])
        {
            arrow_y(79);
        };
    };

    //----------------------------------------------------------------------------------------------
    translate([60, 0, 0])
    {
        back_panel_1();
        translate([0, 54, 0])
        {
            arrow_x(5);
        };
        translate([-1, 0, 0])
        {
            arrow_y(53);
        };
    };

    //----------------------------------------------------------------------------------------------
    translate([70, 0, 0])
    {
        center_bar();
        translate([0, 80, 0])
        {
            arrow_x(3.5);
        };
        translate([-1, 0, 0])
        {
            arrow_y(79);
        };
    };

    //----------------------------------------------------------------------------------------------
    translate([80, 0, 0])
    {
        center_bar_leg();
        translate([0, 13, 0])
        {
            arrow_x(3.5);
        };
        translate([-1, 0, 0])
        {
            arrow_y(12);
        };
    };

    //----------------------------------------------------------------------------------------------
    translate([90, 0, 0])
    {
        side_bar();
        translate([0, 74, 0])
        {
            arrow_x(1.5);
        };
        translate([-1, 0, 0])
        {
            arrow_y(73);
        };
    };

    //----------------------------------------------------------------------------------------------
    translate([100, 0, 0])
    {
        board();
        translate([0, 54, 0])
        {
            arrow_x(3.5);
        };
        translate([-1, 0, 0])
        {
            arrow_y(53);
        };
    };

    //----------------------------------------------------------------------------------------------
    translate([110, 0, 0])
    {
        back_panel_2();
        translate([0, 57, 0])
        {
            arrow_x(7.5);
        };
        translate([-1, 0, 0])
        {
            arrow_y(56);
        };
    };
}
